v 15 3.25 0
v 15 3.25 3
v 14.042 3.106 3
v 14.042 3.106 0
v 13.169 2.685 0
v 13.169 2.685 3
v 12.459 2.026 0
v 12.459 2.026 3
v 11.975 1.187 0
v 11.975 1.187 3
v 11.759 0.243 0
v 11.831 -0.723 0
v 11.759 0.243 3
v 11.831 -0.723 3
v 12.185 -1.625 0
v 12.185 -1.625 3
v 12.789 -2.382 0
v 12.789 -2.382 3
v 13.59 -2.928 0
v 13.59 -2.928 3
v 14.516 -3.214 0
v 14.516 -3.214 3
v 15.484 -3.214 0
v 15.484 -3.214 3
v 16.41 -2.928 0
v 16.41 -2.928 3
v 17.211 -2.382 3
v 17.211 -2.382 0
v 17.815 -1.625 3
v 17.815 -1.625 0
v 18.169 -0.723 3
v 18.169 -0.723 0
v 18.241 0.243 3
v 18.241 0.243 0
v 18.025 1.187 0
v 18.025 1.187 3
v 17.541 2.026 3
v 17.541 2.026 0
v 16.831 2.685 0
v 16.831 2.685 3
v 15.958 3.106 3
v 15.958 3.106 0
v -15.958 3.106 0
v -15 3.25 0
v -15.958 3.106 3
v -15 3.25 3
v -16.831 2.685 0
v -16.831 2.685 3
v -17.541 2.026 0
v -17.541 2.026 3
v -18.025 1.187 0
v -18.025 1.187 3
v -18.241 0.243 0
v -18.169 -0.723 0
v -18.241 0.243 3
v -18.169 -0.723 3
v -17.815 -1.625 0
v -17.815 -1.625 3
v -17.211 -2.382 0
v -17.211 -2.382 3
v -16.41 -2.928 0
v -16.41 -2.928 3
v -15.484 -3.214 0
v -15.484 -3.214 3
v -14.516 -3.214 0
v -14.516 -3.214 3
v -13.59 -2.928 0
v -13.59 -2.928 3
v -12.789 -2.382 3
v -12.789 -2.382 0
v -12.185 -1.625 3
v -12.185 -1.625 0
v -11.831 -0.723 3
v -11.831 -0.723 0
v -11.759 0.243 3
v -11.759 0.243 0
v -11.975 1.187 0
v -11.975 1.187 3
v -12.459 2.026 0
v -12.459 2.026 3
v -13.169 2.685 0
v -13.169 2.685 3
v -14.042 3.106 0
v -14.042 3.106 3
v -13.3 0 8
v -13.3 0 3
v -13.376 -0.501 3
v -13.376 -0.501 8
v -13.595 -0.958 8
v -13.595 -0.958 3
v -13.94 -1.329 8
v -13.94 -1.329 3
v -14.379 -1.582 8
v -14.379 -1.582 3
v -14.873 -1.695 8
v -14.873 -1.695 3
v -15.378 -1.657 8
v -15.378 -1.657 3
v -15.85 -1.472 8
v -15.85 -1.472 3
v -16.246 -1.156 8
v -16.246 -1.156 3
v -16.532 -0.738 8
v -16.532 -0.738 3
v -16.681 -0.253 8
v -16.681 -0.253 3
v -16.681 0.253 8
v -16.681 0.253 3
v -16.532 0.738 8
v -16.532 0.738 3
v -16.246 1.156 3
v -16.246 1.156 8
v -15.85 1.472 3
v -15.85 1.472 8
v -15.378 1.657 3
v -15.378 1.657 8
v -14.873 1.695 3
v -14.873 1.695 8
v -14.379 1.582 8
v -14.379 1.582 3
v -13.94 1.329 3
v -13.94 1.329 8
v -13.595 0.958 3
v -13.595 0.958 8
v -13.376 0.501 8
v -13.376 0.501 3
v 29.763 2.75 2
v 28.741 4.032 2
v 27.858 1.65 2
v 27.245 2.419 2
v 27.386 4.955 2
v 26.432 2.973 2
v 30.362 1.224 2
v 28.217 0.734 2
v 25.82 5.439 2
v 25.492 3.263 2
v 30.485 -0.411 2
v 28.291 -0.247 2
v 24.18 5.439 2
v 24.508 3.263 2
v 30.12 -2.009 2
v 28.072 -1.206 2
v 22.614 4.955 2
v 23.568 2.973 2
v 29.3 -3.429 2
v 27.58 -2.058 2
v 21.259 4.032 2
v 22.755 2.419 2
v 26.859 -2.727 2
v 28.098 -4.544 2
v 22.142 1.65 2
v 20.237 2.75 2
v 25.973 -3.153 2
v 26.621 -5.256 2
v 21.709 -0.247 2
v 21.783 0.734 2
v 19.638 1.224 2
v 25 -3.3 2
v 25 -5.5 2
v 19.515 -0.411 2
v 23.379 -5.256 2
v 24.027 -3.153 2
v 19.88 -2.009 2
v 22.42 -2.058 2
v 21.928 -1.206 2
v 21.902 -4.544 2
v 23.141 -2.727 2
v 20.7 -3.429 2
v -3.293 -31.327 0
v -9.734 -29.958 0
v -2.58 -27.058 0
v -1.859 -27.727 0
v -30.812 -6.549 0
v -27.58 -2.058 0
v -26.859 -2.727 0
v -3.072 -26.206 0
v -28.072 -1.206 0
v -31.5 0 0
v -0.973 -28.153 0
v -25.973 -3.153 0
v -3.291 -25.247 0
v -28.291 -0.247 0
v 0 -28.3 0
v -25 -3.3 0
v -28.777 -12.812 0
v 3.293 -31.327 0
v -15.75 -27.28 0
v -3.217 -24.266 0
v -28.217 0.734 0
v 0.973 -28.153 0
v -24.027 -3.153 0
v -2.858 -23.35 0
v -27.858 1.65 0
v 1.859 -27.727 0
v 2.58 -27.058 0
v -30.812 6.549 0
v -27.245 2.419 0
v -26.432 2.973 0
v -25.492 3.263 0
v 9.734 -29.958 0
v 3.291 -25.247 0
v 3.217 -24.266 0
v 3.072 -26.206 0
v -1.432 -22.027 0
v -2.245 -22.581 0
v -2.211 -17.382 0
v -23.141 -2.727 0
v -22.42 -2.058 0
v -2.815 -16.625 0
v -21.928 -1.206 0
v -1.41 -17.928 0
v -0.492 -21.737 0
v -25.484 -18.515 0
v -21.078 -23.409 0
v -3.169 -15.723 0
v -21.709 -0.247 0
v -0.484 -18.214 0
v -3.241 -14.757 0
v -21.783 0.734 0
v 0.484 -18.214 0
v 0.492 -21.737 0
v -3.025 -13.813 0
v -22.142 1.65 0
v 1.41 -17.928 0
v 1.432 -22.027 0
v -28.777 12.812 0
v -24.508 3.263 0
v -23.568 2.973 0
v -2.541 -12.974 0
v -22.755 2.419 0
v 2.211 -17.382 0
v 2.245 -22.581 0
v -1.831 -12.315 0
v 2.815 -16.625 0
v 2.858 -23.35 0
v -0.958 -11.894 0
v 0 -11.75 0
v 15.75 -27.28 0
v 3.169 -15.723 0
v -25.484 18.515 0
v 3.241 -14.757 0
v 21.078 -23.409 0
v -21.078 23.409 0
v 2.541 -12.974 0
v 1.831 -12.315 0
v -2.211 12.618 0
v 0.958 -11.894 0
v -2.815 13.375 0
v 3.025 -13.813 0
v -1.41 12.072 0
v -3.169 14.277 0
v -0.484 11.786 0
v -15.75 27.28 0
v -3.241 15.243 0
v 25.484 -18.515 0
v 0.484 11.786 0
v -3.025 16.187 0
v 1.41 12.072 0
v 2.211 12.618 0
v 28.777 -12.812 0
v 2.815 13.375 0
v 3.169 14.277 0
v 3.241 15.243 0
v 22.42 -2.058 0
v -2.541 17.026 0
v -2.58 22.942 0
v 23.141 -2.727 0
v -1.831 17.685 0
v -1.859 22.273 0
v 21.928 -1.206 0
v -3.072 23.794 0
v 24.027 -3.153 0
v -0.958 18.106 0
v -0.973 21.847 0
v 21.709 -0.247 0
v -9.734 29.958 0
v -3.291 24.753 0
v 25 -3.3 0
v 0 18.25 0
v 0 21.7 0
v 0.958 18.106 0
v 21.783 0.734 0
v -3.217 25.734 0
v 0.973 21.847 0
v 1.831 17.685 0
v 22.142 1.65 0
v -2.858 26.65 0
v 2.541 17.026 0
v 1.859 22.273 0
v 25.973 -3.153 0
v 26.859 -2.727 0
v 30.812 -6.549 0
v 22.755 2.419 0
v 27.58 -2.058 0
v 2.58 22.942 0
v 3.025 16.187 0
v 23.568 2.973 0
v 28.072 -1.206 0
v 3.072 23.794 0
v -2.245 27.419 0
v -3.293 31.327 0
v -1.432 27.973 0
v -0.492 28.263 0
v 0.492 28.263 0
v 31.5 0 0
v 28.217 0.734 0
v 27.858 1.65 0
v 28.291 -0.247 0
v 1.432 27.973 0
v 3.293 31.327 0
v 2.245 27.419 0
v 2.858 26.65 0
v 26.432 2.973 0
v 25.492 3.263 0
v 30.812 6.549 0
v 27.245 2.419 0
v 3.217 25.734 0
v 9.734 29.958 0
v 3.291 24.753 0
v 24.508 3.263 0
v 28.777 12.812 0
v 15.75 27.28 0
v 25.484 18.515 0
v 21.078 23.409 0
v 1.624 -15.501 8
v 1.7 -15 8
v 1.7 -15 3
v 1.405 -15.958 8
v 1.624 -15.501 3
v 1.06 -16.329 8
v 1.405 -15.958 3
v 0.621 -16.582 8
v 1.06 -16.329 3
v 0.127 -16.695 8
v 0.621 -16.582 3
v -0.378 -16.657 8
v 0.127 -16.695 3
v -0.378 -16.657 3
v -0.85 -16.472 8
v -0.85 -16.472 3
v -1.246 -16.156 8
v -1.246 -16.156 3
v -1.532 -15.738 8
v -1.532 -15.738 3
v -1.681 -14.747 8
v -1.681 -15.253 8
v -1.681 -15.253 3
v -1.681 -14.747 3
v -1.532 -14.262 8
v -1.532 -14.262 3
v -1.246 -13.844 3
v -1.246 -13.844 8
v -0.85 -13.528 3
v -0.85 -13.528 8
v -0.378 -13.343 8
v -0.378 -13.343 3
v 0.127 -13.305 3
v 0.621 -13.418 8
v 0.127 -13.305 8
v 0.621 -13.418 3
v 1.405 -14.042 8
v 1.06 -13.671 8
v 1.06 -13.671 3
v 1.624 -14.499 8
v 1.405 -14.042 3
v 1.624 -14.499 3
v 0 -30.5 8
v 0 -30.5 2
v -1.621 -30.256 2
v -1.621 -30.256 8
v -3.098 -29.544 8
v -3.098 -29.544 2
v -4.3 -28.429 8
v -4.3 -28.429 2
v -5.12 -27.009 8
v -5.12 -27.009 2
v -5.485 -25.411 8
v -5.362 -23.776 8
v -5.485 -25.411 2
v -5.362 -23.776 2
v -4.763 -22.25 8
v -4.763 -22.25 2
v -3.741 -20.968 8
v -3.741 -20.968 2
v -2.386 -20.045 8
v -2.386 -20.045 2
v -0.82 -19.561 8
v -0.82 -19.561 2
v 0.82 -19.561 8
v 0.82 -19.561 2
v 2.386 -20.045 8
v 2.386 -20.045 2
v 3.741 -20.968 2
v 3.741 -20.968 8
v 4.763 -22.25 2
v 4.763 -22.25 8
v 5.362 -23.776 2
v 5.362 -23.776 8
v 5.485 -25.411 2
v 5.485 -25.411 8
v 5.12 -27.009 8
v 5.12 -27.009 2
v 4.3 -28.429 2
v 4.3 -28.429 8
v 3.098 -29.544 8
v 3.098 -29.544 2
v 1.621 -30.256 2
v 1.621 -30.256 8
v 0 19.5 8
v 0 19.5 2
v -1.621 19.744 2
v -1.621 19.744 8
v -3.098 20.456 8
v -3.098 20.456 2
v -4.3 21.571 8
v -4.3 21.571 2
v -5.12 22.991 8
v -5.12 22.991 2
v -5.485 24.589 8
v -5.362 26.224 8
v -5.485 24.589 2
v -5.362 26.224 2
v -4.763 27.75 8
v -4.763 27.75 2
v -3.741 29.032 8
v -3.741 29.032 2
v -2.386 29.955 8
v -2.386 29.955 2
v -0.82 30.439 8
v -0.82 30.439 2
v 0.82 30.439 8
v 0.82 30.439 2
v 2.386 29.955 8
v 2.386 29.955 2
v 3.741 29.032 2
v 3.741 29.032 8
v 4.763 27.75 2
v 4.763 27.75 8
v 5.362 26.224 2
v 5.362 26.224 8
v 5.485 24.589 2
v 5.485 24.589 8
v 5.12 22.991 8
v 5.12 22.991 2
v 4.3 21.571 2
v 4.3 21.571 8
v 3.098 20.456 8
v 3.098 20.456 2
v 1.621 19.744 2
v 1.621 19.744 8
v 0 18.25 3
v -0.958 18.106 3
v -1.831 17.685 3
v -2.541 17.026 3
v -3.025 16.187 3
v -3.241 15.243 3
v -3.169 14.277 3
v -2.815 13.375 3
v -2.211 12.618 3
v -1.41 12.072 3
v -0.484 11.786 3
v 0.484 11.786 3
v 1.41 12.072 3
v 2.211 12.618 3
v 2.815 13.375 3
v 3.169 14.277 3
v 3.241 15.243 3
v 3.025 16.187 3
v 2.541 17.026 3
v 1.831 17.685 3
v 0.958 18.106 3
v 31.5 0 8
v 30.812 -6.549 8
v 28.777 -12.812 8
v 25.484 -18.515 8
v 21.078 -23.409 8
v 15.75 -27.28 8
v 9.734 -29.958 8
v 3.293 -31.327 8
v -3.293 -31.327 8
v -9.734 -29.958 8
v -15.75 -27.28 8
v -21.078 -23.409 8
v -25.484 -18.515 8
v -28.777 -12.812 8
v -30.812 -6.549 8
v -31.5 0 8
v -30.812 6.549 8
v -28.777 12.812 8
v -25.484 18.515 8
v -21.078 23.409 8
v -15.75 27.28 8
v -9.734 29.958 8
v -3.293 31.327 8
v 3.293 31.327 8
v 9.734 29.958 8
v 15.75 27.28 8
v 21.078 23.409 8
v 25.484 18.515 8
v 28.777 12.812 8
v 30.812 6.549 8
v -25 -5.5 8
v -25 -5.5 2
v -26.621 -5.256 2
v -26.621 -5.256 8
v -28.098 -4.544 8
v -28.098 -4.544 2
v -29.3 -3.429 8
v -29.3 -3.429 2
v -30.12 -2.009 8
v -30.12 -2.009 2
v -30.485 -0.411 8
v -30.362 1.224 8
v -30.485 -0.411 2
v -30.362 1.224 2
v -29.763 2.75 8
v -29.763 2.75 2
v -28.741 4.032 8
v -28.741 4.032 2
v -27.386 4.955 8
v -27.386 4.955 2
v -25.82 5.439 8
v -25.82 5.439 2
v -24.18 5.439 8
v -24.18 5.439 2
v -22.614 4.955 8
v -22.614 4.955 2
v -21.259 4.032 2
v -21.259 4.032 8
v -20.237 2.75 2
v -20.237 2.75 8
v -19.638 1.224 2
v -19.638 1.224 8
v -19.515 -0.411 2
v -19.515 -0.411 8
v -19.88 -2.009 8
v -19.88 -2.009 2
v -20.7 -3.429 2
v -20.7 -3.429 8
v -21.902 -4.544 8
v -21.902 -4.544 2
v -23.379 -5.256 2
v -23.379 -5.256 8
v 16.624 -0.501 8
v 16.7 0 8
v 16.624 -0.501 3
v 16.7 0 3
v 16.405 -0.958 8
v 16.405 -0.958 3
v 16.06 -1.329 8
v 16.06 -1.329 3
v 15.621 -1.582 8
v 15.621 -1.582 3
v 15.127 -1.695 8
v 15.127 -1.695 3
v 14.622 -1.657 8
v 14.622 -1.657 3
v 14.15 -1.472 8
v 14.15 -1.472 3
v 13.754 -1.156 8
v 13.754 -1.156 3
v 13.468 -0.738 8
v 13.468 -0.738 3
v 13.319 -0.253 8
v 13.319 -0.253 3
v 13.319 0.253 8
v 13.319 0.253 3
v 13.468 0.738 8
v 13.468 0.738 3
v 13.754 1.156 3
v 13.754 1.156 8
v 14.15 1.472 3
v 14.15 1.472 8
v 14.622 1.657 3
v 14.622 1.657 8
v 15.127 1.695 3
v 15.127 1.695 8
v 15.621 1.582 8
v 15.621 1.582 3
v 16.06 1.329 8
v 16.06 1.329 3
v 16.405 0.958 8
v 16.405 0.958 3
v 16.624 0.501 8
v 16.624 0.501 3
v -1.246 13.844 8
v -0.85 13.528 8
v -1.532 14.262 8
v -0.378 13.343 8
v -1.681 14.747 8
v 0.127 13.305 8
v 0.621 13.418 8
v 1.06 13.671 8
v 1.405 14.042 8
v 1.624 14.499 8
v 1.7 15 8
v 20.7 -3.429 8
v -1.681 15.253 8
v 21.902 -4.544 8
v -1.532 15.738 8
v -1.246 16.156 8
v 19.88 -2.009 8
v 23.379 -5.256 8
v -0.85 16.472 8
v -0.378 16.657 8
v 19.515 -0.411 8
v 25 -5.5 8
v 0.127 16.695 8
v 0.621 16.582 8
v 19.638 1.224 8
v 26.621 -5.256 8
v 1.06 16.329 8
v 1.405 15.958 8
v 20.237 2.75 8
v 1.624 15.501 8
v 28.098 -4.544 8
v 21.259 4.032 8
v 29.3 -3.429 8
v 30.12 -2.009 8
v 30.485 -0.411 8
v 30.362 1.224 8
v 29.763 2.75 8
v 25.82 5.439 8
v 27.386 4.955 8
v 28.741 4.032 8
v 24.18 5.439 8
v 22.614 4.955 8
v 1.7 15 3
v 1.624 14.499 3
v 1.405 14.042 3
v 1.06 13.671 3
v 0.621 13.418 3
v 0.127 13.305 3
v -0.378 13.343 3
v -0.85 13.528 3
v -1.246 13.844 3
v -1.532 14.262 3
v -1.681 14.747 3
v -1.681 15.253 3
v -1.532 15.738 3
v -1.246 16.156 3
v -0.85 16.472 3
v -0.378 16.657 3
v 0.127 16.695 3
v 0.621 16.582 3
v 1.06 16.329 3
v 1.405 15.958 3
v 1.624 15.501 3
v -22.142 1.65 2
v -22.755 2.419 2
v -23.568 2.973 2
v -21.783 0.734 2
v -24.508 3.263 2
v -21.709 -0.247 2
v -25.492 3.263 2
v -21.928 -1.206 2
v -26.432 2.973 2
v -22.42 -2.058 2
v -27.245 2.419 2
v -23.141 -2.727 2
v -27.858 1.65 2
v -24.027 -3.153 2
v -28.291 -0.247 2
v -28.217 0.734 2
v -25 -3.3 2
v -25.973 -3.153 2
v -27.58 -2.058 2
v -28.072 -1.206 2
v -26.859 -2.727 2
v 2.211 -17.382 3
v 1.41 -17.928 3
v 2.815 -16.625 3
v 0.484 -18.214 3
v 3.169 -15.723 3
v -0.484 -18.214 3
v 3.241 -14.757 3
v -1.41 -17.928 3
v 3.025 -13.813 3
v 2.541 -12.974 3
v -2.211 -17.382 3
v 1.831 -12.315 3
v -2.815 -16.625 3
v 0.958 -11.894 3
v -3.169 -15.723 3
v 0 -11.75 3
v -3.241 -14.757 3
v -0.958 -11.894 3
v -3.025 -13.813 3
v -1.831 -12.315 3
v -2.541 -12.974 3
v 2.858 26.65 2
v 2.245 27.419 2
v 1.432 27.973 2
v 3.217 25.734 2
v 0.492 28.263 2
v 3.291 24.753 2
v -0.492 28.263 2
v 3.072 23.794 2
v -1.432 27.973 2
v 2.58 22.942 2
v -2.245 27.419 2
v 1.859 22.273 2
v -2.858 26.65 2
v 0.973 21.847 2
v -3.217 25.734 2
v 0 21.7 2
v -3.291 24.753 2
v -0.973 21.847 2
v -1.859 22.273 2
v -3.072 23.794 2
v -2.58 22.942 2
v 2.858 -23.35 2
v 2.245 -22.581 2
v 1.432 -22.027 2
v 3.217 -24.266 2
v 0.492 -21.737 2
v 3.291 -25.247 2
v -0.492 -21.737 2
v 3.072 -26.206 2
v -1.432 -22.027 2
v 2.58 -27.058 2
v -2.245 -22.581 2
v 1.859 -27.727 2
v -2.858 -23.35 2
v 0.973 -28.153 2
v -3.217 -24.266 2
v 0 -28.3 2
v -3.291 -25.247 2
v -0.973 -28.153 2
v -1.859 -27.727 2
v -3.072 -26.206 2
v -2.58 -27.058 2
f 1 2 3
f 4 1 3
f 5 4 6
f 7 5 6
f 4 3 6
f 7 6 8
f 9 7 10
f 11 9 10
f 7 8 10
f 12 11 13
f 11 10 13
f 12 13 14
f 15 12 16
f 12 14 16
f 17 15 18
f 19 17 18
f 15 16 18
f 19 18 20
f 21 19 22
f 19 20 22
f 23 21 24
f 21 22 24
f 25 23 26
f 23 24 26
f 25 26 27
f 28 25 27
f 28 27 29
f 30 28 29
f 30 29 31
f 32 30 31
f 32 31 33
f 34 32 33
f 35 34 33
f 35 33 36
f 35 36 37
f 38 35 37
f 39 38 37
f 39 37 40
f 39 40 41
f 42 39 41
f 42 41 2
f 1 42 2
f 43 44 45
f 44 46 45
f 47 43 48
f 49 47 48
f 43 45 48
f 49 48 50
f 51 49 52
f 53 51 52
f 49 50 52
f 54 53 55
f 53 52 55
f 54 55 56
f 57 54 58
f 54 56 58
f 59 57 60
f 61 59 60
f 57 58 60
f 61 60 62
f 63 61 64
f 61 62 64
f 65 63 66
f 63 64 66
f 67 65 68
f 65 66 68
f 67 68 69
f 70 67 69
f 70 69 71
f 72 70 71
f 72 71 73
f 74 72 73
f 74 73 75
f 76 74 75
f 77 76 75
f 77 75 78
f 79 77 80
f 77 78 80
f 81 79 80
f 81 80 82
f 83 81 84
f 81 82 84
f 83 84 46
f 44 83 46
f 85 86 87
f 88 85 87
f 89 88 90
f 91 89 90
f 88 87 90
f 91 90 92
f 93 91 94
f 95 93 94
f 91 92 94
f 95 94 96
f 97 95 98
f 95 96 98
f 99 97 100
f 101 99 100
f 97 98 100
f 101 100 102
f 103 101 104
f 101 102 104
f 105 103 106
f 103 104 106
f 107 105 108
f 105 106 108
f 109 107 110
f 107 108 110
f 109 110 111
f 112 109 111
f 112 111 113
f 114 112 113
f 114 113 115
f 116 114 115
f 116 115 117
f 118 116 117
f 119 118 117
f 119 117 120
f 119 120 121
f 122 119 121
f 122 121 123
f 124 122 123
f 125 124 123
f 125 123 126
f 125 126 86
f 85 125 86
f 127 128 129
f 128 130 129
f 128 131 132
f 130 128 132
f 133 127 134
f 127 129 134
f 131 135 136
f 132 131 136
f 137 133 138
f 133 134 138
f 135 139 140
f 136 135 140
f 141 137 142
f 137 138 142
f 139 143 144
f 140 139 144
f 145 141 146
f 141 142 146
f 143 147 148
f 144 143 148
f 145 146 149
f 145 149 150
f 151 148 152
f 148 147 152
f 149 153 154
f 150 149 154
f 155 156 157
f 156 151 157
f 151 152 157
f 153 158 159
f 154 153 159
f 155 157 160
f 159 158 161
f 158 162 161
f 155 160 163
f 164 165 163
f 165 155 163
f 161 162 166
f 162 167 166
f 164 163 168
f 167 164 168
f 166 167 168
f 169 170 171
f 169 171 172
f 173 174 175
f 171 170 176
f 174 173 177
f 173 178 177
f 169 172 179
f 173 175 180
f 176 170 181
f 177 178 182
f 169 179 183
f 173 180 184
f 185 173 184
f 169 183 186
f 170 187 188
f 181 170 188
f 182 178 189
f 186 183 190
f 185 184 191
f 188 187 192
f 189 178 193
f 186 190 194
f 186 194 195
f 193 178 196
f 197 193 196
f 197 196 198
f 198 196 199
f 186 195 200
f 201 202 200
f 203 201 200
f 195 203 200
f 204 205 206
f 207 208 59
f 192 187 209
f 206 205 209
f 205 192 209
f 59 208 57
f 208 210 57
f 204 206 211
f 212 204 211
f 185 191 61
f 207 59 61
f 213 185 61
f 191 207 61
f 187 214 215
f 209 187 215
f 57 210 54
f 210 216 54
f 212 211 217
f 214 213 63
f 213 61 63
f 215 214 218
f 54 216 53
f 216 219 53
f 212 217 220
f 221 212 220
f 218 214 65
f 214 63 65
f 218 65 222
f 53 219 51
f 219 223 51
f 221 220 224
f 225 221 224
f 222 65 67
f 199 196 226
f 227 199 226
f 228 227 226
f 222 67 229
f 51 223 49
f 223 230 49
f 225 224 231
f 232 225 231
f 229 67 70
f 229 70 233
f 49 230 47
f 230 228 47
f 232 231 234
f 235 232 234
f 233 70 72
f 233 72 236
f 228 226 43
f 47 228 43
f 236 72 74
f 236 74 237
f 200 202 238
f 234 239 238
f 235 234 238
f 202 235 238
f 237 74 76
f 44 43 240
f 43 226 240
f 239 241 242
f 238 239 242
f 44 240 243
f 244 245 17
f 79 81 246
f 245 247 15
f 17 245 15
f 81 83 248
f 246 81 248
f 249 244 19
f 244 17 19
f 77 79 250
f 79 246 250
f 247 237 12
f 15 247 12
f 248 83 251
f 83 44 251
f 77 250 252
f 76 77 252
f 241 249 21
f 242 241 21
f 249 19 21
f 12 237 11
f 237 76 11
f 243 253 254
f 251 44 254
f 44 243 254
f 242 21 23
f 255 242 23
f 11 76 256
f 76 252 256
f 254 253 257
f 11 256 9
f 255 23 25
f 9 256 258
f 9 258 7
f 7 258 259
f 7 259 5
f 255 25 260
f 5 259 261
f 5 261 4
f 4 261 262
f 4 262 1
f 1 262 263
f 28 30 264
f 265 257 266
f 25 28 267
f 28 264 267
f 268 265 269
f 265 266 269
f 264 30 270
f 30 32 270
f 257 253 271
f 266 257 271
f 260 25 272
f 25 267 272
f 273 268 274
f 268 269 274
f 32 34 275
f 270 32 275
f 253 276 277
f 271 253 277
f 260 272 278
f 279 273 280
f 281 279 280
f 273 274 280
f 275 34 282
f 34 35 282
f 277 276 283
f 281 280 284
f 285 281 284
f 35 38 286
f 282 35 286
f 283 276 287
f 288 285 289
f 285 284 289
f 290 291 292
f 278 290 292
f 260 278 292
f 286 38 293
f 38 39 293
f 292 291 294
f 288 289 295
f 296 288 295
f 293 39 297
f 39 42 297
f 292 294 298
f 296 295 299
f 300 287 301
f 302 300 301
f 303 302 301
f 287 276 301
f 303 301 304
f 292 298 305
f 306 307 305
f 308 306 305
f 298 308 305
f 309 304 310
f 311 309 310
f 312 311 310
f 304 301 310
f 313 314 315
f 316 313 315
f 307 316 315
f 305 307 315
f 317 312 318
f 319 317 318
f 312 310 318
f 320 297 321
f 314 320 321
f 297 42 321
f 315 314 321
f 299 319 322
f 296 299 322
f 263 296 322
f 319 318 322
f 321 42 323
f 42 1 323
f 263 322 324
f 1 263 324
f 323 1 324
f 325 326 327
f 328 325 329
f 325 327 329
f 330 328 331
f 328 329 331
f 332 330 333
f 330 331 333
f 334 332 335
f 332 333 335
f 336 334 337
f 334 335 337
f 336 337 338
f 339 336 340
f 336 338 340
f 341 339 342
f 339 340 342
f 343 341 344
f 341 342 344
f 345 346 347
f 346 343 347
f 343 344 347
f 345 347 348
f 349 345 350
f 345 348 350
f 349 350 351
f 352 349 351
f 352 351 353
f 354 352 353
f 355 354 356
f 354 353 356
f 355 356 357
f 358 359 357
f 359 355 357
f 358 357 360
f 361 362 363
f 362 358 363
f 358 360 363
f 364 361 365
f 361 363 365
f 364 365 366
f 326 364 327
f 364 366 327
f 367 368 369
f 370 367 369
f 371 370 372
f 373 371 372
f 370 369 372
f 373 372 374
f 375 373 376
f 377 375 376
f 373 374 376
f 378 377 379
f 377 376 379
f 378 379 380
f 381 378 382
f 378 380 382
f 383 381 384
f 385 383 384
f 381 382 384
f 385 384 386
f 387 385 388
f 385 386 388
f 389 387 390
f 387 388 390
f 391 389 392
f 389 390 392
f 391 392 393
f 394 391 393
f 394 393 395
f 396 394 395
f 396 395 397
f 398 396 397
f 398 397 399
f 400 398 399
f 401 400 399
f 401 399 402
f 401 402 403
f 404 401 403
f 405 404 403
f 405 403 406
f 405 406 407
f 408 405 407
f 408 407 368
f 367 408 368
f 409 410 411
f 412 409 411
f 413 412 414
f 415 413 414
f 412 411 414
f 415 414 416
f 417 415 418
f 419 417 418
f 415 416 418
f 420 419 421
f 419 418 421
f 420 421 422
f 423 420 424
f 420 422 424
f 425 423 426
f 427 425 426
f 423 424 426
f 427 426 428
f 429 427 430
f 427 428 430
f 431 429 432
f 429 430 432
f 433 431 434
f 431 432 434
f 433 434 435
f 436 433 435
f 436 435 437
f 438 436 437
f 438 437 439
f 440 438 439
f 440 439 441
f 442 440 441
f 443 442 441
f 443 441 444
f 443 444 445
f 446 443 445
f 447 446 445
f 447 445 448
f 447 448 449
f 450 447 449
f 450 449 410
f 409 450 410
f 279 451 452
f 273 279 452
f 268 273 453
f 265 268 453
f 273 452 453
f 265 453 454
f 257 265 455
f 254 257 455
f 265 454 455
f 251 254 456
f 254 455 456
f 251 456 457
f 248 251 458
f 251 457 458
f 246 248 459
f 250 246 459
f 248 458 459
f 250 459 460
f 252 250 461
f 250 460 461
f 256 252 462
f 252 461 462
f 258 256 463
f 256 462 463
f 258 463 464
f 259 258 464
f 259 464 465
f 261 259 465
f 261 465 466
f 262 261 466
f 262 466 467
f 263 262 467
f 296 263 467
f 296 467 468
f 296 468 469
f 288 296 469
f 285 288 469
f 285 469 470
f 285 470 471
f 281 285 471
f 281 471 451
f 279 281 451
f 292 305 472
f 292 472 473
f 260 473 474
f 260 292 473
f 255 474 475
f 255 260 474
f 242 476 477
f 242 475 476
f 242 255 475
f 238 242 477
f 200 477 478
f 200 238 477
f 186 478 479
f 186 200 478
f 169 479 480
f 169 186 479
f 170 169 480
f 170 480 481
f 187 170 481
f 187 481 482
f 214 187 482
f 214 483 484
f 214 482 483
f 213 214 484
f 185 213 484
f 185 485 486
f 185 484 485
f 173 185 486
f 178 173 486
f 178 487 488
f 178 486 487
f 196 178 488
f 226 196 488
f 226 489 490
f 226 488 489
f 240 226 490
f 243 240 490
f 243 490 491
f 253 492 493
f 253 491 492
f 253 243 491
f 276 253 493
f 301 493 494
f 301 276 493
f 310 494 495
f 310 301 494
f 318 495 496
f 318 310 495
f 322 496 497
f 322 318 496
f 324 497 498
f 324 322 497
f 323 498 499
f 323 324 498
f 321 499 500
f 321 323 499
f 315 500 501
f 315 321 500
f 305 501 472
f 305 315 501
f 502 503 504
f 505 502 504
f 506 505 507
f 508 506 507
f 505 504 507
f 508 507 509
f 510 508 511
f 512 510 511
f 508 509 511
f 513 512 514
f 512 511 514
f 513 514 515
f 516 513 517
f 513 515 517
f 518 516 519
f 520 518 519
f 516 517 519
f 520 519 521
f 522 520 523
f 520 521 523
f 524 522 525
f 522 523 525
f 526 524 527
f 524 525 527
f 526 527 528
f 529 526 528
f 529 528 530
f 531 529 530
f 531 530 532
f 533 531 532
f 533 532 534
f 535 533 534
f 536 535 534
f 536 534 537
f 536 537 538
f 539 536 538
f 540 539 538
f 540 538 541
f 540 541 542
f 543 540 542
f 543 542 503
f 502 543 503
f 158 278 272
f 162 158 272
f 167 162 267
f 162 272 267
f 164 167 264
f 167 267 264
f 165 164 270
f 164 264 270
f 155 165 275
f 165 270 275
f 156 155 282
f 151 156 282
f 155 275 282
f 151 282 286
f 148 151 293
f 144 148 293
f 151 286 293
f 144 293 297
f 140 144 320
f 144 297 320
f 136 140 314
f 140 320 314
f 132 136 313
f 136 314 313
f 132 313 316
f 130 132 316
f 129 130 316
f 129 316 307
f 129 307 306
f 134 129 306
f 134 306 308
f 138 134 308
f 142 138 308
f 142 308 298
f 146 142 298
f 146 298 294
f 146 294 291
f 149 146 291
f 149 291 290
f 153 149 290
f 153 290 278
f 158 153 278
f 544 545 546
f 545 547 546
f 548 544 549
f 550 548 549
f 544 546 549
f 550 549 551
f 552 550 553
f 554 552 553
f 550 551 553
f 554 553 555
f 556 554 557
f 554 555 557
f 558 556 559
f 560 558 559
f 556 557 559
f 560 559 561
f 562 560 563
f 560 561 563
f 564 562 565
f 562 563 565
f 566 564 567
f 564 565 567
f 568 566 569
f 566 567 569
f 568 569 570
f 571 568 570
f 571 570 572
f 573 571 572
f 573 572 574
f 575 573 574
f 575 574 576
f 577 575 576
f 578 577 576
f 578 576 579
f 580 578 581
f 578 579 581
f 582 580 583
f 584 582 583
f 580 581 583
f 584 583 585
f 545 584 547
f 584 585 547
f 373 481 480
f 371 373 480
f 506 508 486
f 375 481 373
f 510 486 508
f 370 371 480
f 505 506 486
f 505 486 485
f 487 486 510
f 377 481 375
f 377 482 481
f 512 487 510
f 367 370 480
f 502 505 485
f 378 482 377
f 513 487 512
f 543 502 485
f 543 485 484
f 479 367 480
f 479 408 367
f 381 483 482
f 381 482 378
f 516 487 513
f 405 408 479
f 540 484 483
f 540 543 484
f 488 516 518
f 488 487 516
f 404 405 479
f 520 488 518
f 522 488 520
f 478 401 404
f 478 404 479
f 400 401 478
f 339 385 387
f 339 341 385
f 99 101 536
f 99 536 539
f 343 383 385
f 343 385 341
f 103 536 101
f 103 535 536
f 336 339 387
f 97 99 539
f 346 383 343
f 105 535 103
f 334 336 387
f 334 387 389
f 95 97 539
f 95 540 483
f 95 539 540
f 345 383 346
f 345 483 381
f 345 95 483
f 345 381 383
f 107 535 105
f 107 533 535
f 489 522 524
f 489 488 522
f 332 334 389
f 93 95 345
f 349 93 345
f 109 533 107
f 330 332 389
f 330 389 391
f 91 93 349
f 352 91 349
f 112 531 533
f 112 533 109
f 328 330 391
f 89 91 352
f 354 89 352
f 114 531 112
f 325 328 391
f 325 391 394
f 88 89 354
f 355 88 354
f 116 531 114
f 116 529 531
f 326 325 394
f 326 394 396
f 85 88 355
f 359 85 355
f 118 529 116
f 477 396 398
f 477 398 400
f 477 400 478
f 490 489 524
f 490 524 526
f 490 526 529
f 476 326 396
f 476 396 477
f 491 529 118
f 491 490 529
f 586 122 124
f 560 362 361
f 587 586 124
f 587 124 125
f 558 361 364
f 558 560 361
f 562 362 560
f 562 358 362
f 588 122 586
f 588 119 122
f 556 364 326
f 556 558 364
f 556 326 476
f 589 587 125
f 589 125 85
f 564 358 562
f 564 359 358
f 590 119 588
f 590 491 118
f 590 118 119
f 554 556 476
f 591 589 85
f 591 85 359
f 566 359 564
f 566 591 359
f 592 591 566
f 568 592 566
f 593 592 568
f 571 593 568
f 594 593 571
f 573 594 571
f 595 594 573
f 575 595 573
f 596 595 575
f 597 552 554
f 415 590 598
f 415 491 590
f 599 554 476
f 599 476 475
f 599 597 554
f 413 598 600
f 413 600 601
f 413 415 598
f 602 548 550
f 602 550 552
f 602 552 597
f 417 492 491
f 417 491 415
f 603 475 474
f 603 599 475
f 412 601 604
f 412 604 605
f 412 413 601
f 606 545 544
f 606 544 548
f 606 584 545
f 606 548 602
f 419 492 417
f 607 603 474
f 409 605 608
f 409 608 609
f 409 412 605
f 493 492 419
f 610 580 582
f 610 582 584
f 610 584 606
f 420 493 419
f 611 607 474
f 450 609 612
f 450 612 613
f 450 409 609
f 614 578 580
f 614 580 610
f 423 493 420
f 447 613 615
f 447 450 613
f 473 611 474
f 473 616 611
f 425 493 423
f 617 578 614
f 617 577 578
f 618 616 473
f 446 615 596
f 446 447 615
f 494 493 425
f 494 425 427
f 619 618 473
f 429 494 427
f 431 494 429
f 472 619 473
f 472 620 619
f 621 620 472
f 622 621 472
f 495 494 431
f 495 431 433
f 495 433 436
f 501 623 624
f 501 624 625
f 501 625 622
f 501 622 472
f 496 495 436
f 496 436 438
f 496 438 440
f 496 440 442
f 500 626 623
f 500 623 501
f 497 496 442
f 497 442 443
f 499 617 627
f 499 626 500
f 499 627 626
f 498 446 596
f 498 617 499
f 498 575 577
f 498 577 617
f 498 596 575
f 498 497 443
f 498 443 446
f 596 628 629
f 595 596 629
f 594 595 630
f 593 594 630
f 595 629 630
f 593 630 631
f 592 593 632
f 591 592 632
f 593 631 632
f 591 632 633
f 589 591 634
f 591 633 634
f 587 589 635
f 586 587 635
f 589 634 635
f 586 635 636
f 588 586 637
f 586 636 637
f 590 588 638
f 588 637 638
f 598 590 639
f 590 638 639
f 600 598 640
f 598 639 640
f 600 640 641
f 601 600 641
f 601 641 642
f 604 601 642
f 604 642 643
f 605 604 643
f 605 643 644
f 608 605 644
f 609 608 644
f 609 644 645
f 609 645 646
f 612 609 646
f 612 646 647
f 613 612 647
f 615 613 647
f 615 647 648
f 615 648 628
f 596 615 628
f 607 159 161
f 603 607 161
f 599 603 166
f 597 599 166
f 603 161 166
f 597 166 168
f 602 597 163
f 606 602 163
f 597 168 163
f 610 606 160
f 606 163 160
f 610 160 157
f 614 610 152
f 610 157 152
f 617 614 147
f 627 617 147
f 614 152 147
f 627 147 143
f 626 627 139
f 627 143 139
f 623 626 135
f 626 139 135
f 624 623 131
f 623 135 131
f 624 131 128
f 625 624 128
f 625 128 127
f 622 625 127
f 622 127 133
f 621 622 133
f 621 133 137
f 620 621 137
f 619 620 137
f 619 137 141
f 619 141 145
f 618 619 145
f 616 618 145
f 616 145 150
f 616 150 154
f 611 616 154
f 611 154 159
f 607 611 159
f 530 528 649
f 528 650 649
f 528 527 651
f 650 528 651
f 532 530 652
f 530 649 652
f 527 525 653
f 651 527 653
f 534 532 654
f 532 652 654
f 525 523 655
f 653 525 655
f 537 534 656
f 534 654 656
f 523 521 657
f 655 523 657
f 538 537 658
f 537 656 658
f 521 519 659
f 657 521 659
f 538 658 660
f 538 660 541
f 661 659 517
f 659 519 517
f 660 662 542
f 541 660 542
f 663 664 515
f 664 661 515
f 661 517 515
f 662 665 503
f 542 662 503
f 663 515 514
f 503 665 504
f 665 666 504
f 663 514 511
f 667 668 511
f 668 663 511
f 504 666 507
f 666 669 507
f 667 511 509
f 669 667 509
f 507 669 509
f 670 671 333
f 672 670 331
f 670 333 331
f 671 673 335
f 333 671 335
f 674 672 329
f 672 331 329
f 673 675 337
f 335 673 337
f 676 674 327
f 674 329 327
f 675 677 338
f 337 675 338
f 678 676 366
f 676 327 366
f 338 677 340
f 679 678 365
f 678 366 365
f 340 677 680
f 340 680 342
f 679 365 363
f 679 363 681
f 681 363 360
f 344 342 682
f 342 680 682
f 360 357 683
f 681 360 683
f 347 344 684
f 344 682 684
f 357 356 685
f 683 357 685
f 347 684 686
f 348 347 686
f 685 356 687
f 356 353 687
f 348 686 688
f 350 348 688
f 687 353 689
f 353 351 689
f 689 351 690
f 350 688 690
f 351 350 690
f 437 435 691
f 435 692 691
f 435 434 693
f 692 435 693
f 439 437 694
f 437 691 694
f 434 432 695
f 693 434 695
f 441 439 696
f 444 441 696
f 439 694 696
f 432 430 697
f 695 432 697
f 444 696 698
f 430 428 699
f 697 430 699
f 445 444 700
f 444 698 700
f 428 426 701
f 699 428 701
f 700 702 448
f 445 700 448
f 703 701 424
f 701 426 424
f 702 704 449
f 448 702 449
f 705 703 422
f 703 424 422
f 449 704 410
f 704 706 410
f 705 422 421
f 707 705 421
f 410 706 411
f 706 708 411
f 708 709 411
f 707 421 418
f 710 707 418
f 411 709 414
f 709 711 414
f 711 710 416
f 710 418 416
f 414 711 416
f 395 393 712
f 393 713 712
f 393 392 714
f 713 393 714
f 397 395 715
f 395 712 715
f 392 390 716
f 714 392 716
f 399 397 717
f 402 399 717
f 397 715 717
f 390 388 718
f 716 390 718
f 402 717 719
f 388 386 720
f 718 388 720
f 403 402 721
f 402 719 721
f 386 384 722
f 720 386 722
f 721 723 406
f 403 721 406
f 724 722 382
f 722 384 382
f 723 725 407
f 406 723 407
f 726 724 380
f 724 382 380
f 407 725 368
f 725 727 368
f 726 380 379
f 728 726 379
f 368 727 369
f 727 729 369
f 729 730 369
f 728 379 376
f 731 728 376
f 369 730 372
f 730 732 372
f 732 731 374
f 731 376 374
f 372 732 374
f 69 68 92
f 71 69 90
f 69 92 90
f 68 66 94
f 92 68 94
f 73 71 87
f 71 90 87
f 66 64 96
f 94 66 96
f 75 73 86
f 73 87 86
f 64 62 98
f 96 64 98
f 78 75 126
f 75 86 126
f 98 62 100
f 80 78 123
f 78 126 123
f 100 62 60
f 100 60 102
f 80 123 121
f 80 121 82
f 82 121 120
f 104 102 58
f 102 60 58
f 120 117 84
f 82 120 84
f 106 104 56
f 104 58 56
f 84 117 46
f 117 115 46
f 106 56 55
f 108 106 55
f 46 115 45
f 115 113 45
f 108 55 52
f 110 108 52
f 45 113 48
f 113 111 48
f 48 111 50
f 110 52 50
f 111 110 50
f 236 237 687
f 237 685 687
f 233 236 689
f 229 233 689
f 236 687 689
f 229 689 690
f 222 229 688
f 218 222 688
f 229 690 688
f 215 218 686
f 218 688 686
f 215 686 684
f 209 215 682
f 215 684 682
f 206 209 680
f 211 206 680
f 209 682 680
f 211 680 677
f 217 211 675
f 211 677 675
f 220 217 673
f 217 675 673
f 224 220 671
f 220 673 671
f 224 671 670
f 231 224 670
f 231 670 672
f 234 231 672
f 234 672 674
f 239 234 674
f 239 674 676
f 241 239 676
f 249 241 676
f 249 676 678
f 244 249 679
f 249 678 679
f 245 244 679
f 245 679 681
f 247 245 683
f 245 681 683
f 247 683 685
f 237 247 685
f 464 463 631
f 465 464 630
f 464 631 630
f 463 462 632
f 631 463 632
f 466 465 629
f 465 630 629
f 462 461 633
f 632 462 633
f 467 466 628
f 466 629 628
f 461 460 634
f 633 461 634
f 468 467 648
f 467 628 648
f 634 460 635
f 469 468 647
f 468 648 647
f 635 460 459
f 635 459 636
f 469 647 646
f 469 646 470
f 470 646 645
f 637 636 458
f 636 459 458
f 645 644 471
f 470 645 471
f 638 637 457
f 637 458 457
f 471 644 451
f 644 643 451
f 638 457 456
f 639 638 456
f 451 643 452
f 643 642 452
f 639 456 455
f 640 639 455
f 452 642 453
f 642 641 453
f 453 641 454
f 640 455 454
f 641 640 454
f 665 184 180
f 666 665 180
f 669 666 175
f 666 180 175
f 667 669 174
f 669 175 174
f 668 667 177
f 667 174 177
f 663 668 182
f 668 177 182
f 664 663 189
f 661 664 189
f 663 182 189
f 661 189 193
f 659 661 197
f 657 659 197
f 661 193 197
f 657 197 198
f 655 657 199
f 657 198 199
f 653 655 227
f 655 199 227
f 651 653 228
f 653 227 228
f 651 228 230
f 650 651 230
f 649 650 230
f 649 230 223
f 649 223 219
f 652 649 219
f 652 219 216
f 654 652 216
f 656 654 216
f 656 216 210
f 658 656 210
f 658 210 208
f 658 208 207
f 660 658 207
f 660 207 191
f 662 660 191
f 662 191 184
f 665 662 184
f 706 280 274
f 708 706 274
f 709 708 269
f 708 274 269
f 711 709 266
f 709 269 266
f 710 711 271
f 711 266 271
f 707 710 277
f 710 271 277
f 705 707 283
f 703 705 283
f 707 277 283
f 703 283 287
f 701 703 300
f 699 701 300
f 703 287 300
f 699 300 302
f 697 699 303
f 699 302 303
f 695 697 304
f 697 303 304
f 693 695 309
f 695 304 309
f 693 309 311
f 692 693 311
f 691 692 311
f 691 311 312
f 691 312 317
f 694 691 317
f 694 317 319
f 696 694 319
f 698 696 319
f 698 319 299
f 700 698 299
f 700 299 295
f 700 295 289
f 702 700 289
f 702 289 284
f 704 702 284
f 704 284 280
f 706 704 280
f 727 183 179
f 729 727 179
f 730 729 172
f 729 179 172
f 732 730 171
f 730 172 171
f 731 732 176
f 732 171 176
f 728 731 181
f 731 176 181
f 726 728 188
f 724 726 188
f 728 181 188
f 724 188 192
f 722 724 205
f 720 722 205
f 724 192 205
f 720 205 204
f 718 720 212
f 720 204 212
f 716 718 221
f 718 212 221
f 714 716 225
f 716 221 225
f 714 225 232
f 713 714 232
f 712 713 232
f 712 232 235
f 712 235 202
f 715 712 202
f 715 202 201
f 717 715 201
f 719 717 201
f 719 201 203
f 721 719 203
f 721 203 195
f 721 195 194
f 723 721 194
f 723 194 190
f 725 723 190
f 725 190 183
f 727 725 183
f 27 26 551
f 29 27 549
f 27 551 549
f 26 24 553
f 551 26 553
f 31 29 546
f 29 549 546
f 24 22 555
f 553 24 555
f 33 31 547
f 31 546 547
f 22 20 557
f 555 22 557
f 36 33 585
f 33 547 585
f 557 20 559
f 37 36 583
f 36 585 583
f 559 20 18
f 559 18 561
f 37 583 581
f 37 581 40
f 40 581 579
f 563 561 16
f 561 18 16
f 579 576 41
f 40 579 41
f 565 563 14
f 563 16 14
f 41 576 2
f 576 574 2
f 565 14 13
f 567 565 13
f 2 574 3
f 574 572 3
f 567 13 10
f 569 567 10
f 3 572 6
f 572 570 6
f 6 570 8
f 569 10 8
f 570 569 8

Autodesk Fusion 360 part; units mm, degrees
sketch "Sketch1" plane through (0, 0, 0) normal (0, 0, 1) x (1, 0, 0)
  circle A0 centre (0, 0) radius 15 construction
  circle A1 centre (0, 15) radius 1.7
  circle A2 centre (-15, 0) radius 1.7
  circle A3 centre (0, -15) radius 1.7
  circle A4 centre (15, 0) radius 1.7
  circle A5 centre (0, 0) radius 25
  circle A6 centre (0, 25) radius 1.5 construction
  circle A7 centre (-25, 0) radius 1.5 construction
  circle A8 centre (0, -25) radius 1.5 construction
  circle A9 centre (25, 0) radius 1.5 construction
  circle A10 centre (0, 0) radius 31.5
  circle A11 centre (0, 0) radius 25 construction
  dimension "d426" = 30
  dimension "d427" = 3.4
  dimension "d429" = 360
  dimension "d430" = 50
  dimension "d432" = 3
  dimension "d442" = 63
  dimension "d443" = 50
extrude "Extrude1" add sketch "Sketch1" along normal blind 8 contours A5 | A10
hole "Hole2" at (15, 0, 0) at (0, -15, 0) at (-15, 0, 0) at (0, 15, 0) direction (0, 0, 1) diameter 3.4 depth 9 tip angle 118 counterbore diameter 6.5 counterbore depth 3
sketch "Sketch2" plane through (0, 0, 8) normal (0, 0, 1) x (-1, 0, 0)
  circle A0 centre (-15, 0) radius 1.7
  circle A1 centre (15, 0) radius 1.7
  circle A2 centre (0, 15) radius 1.7
  circle A3 centre (0, -15) radius 1.7
  circle A4 centre (0, 0) radius 31.5
  circle A5 centre (0, 0) radius 25
  circle A6 centre (0, -25) radius 1.5 construction
  circle A7 centre (25, 0) radius 1.5 construction
  circle A8 centre (0, 25) radius 1.5 construction
  circle A9 centre (-25, 0) radius 1.5 construction
  dimension "d449" = 50
  dimension "d450" = 3
  dimension "d452" = 360
hole "Hole3" at (0, 25, 8) at (25, 0, 8) at (0, -25, 8) at (-25, 0, 8) direction (0, 0, -1) diameter 6.6 depth 9 tip angle 118 counterbore diameter 11 counterbore depth 6
equation "d426 = promjer_utori"
equation "d443 = promjer_silikona"
equation "promjer_prihvata = promjer_silikona - 10 mm"
equation "promjer_silikona = 50 mm"
equation "promjer_utori = promjer_prihvata - 10 mm"
